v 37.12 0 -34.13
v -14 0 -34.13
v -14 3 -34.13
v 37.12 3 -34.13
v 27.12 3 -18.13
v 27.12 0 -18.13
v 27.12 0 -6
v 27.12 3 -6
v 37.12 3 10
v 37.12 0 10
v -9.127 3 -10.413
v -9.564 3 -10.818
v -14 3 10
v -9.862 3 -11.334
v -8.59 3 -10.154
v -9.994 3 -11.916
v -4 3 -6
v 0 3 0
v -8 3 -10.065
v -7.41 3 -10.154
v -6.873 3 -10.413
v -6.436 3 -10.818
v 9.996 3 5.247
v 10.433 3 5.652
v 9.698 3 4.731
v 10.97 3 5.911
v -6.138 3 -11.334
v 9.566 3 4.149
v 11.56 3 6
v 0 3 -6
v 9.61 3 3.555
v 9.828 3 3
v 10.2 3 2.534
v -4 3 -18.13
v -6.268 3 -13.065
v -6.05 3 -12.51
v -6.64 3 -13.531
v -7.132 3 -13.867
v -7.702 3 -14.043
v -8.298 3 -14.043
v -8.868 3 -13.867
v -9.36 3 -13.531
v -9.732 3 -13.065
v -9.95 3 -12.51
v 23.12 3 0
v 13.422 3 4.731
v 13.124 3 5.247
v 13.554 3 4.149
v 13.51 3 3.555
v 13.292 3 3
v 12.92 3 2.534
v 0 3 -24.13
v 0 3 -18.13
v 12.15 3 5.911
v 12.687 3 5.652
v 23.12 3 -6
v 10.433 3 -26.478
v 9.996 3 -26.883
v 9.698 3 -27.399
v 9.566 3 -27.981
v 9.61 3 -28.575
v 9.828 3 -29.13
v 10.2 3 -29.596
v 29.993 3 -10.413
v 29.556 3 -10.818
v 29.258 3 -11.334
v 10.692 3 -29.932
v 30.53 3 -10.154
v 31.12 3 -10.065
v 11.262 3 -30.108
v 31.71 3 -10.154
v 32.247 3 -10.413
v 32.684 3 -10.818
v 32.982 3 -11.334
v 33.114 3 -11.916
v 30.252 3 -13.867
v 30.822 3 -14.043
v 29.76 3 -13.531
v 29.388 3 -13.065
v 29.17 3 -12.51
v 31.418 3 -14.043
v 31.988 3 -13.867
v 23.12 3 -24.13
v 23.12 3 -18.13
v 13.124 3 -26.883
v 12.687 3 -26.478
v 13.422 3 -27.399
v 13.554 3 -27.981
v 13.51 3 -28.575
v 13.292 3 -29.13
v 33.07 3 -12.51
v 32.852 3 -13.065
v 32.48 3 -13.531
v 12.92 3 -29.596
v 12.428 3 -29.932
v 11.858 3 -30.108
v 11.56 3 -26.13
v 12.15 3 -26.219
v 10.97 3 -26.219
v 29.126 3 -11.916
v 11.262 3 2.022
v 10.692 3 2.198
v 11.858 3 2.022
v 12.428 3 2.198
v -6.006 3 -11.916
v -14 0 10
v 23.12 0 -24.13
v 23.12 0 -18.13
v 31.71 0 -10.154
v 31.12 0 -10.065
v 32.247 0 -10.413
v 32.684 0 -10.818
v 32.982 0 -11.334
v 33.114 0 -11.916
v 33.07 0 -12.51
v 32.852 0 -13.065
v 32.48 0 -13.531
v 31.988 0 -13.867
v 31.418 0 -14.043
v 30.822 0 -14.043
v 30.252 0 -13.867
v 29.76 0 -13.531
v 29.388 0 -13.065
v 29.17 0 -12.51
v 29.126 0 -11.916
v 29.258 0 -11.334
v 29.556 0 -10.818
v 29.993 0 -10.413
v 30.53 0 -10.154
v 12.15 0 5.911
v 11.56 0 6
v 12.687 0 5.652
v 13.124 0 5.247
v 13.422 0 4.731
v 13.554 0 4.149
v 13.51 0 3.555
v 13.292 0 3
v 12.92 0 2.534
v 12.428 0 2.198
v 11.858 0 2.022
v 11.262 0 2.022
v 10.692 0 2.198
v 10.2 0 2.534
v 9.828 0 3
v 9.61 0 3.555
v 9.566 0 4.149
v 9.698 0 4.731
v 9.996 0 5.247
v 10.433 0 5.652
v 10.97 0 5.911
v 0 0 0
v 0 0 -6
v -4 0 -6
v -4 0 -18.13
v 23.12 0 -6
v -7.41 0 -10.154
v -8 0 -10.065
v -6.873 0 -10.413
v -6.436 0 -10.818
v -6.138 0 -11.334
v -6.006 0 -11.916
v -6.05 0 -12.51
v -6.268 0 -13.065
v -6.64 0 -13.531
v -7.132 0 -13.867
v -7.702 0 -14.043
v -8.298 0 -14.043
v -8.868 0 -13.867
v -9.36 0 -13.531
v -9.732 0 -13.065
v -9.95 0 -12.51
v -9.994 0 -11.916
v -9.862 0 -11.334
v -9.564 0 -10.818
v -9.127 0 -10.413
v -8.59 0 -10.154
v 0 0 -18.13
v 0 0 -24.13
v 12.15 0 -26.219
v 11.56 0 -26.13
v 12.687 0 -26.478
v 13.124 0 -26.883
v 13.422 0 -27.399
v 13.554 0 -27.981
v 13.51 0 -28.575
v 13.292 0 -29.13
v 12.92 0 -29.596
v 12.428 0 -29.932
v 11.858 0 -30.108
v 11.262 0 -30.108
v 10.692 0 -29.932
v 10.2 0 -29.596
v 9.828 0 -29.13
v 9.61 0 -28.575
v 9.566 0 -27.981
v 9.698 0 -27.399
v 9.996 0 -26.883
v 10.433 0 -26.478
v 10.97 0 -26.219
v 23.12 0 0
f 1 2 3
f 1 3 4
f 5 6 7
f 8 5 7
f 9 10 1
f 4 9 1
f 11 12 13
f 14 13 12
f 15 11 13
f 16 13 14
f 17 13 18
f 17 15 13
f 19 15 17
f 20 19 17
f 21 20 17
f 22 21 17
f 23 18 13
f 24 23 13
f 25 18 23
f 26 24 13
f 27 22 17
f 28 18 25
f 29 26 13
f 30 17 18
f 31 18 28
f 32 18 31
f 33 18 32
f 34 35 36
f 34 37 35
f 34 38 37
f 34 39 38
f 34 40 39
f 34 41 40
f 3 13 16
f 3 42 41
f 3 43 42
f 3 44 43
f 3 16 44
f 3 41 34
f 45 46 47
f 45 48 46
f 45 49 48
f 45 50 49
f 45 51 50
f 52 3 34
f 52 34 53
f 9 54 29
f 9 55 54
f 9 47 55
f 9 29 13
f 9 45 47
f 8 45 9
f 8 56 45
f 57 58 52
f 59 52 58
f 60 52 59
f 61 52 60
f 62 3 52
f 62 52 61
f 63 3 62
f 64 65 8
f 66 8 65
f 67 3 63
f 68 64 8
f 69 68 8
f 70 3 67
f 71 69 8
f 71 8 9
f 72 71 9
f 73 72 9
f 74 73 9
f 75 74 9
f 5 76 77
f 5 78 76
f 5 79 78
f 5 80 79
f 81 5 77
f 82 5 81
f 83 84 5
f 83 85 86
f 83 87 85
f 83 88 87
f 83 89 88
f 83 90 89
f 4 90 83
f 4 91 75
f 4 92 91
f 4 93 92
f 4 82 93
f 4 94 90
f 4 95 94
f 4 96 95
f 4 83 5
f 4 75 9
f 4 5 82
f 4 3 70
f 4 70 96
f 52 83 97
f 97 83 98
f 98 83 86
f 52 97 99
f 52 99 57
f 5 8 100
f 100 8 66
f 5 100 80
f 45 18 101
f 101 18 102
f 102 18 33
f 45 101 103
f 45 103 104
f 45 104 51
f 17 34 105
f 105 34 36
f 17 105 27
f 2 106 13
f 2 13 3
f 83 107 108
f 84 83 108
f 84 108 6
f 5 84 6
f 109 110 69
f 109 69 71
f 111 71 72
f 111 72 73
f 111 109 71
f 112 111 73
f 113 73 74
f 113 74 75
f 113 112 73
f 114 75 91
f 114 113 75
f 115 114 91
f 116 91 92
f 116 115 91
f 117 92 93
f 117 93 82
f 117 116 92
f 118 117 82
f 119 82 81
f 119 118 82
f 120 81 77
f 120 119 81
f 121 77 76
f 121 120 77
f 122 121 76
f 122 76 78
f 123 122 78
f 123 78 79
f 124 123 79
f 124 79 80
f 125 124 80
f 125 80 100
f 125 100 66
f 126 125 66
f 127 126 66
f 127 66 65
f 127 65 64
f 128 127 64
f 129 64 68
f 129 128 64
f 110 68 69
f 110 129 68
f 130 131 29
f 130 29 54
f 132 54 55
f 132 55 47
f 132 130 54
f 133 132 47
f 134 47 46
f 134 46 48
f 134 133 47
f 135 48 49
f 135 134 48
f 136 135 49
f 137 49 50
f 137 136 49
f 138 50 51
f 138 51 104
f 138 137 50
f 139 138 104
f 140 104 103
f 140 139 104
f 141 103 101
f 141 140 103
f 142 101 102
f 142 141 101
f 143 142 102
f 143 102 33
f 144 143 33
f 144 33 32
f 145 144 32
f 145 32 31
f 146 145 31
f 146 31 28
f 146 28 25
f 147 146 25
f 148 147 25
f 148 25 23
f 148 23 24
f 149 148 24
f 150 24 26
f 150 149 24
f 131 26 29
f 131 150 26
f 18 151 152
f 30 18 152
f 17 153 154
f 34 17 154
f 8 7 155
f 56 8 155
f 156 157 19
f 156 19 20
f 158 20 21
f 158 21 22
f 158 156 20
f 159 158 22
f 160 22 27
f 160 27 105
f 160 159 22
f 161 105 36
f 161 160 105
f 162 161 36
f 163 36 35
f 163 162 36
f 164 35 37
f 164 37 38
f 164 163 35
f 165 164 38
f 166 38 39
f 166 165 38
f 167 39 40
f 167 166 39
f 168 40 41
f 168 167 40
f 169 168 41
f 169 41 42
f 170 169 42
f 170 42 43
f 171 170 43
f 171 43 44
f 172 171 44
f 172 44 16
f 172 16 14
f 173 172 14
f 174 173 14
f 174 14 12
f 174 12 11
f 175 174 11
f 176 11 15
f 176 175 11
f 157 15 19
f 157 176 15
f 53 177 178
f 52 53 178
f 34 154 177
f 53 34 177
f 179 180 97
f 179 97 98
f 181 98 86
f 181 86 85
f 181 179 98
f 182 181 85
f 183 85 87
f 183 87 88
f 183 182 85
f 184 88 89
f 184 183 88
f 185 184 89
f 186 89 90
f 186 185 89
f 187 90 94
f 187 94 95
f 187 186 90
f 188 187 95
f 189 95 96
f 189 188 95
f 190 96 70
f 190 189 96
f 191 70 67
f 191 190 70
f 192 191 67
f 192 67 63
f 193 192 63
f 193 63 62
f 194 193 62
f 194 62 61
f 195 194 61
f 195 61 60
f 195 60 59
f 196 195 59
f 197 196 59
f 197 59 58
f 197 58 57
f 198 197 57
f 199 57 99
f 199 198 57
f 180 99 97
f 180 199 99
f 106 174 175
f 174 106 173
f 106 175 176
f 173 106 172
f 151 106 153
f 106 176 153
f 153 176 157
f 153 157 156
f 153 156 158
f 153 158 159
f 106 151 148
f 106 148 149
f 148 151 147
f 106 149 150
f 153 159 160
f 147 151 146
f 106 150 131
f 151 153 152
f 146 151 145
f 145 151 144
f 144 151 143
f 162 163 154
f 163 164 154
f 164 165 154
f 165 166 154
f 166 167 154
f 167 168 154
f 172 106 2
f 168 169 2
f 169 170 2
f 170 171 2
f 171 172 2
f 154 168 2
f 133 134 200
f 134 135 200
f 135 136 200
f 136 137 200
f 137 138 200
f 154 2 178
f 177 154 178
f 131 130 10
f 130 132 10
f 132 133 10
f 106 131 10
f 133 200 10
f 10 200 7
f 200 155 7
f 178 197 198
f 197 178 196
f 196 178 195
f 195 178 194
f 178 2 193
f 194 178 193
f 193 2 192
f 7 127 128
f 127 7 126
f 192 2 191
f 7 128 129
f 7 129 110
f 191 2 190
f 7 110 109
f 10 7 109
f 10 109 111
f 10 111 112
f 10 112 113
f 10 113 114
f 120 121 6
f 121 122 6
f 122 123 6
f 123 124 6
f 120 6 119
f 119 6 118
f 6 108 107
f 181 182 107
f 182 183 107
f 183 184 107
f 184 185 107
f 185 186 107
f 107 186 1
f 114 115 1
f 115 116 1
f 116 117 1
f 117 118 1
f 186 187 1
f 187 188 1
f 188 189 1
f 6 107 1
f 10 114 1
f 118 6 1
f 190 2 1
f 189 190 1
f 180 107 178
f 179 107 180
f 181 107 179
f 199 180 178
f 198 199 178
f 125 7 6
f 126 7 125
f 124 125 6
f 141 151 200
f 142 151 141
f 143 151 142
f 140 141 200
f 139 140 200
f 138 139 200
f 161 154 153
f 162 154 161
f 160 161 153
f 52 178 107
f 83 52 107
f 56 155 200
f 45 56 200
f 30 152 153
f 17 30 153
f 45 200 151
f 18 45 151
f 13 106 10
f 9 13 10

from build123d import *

# Parameters (mm, degrees)
ESBO_O1_W                = 51.12
ESBO_O1_H                = 44.13
ESBO_O1_R                = 2
RESSALTO_EXTRUS_O1_DEPTH = 3


with BuildPart() as part:
    # Esboço1 → Ressalto-extrusão1 (new body)
    with BuildSketch(Plane(origin=(0, 0, 0), x_dir=(1, 0, 0), z_dir=(0, 1, 0))):
        with Locations((11.56, 12.065)):
            Rectangle(ESBO_O1_W, ESBO_O1_H)
        with Locations(Location((31.12, 12.065, 0), (0, 0, 270))):
            Circle(ESBO_O1_R, mode=Mode.SUBTRACT)
        with Locations(Location((-8, 12.065, 0), (0, 0, 270))):
            Circle(ESBO_O1_R, mode=Mode.SUBTRACT)
        with Locations(Location((11.56, 28.13, 0), (0, 0, 270))):
            Circle(ESBO_O1_R, mode=Mode.SUBTRACT)
        with Locations(Location((11.56, -4, 0), (0, 0, 270))):
            Circle(ESBO_O1_R, mode=Mode.SUBTRACT)
        Polygon((23.12, 24.13), (23.12, 18.13), (27.12, 18.13), (27.12, 6), (23.12, 6), (23.12, 0), (0, 0), (0, 6), (-4, 6), (-4, 18.13), (0, 18.13), (0, 24.13), align=None, mode=Mode.SUBTRACT)
    extrude(amount=RESSALTO_EXTRUS_O1_DEPTH)


solid = part.part
